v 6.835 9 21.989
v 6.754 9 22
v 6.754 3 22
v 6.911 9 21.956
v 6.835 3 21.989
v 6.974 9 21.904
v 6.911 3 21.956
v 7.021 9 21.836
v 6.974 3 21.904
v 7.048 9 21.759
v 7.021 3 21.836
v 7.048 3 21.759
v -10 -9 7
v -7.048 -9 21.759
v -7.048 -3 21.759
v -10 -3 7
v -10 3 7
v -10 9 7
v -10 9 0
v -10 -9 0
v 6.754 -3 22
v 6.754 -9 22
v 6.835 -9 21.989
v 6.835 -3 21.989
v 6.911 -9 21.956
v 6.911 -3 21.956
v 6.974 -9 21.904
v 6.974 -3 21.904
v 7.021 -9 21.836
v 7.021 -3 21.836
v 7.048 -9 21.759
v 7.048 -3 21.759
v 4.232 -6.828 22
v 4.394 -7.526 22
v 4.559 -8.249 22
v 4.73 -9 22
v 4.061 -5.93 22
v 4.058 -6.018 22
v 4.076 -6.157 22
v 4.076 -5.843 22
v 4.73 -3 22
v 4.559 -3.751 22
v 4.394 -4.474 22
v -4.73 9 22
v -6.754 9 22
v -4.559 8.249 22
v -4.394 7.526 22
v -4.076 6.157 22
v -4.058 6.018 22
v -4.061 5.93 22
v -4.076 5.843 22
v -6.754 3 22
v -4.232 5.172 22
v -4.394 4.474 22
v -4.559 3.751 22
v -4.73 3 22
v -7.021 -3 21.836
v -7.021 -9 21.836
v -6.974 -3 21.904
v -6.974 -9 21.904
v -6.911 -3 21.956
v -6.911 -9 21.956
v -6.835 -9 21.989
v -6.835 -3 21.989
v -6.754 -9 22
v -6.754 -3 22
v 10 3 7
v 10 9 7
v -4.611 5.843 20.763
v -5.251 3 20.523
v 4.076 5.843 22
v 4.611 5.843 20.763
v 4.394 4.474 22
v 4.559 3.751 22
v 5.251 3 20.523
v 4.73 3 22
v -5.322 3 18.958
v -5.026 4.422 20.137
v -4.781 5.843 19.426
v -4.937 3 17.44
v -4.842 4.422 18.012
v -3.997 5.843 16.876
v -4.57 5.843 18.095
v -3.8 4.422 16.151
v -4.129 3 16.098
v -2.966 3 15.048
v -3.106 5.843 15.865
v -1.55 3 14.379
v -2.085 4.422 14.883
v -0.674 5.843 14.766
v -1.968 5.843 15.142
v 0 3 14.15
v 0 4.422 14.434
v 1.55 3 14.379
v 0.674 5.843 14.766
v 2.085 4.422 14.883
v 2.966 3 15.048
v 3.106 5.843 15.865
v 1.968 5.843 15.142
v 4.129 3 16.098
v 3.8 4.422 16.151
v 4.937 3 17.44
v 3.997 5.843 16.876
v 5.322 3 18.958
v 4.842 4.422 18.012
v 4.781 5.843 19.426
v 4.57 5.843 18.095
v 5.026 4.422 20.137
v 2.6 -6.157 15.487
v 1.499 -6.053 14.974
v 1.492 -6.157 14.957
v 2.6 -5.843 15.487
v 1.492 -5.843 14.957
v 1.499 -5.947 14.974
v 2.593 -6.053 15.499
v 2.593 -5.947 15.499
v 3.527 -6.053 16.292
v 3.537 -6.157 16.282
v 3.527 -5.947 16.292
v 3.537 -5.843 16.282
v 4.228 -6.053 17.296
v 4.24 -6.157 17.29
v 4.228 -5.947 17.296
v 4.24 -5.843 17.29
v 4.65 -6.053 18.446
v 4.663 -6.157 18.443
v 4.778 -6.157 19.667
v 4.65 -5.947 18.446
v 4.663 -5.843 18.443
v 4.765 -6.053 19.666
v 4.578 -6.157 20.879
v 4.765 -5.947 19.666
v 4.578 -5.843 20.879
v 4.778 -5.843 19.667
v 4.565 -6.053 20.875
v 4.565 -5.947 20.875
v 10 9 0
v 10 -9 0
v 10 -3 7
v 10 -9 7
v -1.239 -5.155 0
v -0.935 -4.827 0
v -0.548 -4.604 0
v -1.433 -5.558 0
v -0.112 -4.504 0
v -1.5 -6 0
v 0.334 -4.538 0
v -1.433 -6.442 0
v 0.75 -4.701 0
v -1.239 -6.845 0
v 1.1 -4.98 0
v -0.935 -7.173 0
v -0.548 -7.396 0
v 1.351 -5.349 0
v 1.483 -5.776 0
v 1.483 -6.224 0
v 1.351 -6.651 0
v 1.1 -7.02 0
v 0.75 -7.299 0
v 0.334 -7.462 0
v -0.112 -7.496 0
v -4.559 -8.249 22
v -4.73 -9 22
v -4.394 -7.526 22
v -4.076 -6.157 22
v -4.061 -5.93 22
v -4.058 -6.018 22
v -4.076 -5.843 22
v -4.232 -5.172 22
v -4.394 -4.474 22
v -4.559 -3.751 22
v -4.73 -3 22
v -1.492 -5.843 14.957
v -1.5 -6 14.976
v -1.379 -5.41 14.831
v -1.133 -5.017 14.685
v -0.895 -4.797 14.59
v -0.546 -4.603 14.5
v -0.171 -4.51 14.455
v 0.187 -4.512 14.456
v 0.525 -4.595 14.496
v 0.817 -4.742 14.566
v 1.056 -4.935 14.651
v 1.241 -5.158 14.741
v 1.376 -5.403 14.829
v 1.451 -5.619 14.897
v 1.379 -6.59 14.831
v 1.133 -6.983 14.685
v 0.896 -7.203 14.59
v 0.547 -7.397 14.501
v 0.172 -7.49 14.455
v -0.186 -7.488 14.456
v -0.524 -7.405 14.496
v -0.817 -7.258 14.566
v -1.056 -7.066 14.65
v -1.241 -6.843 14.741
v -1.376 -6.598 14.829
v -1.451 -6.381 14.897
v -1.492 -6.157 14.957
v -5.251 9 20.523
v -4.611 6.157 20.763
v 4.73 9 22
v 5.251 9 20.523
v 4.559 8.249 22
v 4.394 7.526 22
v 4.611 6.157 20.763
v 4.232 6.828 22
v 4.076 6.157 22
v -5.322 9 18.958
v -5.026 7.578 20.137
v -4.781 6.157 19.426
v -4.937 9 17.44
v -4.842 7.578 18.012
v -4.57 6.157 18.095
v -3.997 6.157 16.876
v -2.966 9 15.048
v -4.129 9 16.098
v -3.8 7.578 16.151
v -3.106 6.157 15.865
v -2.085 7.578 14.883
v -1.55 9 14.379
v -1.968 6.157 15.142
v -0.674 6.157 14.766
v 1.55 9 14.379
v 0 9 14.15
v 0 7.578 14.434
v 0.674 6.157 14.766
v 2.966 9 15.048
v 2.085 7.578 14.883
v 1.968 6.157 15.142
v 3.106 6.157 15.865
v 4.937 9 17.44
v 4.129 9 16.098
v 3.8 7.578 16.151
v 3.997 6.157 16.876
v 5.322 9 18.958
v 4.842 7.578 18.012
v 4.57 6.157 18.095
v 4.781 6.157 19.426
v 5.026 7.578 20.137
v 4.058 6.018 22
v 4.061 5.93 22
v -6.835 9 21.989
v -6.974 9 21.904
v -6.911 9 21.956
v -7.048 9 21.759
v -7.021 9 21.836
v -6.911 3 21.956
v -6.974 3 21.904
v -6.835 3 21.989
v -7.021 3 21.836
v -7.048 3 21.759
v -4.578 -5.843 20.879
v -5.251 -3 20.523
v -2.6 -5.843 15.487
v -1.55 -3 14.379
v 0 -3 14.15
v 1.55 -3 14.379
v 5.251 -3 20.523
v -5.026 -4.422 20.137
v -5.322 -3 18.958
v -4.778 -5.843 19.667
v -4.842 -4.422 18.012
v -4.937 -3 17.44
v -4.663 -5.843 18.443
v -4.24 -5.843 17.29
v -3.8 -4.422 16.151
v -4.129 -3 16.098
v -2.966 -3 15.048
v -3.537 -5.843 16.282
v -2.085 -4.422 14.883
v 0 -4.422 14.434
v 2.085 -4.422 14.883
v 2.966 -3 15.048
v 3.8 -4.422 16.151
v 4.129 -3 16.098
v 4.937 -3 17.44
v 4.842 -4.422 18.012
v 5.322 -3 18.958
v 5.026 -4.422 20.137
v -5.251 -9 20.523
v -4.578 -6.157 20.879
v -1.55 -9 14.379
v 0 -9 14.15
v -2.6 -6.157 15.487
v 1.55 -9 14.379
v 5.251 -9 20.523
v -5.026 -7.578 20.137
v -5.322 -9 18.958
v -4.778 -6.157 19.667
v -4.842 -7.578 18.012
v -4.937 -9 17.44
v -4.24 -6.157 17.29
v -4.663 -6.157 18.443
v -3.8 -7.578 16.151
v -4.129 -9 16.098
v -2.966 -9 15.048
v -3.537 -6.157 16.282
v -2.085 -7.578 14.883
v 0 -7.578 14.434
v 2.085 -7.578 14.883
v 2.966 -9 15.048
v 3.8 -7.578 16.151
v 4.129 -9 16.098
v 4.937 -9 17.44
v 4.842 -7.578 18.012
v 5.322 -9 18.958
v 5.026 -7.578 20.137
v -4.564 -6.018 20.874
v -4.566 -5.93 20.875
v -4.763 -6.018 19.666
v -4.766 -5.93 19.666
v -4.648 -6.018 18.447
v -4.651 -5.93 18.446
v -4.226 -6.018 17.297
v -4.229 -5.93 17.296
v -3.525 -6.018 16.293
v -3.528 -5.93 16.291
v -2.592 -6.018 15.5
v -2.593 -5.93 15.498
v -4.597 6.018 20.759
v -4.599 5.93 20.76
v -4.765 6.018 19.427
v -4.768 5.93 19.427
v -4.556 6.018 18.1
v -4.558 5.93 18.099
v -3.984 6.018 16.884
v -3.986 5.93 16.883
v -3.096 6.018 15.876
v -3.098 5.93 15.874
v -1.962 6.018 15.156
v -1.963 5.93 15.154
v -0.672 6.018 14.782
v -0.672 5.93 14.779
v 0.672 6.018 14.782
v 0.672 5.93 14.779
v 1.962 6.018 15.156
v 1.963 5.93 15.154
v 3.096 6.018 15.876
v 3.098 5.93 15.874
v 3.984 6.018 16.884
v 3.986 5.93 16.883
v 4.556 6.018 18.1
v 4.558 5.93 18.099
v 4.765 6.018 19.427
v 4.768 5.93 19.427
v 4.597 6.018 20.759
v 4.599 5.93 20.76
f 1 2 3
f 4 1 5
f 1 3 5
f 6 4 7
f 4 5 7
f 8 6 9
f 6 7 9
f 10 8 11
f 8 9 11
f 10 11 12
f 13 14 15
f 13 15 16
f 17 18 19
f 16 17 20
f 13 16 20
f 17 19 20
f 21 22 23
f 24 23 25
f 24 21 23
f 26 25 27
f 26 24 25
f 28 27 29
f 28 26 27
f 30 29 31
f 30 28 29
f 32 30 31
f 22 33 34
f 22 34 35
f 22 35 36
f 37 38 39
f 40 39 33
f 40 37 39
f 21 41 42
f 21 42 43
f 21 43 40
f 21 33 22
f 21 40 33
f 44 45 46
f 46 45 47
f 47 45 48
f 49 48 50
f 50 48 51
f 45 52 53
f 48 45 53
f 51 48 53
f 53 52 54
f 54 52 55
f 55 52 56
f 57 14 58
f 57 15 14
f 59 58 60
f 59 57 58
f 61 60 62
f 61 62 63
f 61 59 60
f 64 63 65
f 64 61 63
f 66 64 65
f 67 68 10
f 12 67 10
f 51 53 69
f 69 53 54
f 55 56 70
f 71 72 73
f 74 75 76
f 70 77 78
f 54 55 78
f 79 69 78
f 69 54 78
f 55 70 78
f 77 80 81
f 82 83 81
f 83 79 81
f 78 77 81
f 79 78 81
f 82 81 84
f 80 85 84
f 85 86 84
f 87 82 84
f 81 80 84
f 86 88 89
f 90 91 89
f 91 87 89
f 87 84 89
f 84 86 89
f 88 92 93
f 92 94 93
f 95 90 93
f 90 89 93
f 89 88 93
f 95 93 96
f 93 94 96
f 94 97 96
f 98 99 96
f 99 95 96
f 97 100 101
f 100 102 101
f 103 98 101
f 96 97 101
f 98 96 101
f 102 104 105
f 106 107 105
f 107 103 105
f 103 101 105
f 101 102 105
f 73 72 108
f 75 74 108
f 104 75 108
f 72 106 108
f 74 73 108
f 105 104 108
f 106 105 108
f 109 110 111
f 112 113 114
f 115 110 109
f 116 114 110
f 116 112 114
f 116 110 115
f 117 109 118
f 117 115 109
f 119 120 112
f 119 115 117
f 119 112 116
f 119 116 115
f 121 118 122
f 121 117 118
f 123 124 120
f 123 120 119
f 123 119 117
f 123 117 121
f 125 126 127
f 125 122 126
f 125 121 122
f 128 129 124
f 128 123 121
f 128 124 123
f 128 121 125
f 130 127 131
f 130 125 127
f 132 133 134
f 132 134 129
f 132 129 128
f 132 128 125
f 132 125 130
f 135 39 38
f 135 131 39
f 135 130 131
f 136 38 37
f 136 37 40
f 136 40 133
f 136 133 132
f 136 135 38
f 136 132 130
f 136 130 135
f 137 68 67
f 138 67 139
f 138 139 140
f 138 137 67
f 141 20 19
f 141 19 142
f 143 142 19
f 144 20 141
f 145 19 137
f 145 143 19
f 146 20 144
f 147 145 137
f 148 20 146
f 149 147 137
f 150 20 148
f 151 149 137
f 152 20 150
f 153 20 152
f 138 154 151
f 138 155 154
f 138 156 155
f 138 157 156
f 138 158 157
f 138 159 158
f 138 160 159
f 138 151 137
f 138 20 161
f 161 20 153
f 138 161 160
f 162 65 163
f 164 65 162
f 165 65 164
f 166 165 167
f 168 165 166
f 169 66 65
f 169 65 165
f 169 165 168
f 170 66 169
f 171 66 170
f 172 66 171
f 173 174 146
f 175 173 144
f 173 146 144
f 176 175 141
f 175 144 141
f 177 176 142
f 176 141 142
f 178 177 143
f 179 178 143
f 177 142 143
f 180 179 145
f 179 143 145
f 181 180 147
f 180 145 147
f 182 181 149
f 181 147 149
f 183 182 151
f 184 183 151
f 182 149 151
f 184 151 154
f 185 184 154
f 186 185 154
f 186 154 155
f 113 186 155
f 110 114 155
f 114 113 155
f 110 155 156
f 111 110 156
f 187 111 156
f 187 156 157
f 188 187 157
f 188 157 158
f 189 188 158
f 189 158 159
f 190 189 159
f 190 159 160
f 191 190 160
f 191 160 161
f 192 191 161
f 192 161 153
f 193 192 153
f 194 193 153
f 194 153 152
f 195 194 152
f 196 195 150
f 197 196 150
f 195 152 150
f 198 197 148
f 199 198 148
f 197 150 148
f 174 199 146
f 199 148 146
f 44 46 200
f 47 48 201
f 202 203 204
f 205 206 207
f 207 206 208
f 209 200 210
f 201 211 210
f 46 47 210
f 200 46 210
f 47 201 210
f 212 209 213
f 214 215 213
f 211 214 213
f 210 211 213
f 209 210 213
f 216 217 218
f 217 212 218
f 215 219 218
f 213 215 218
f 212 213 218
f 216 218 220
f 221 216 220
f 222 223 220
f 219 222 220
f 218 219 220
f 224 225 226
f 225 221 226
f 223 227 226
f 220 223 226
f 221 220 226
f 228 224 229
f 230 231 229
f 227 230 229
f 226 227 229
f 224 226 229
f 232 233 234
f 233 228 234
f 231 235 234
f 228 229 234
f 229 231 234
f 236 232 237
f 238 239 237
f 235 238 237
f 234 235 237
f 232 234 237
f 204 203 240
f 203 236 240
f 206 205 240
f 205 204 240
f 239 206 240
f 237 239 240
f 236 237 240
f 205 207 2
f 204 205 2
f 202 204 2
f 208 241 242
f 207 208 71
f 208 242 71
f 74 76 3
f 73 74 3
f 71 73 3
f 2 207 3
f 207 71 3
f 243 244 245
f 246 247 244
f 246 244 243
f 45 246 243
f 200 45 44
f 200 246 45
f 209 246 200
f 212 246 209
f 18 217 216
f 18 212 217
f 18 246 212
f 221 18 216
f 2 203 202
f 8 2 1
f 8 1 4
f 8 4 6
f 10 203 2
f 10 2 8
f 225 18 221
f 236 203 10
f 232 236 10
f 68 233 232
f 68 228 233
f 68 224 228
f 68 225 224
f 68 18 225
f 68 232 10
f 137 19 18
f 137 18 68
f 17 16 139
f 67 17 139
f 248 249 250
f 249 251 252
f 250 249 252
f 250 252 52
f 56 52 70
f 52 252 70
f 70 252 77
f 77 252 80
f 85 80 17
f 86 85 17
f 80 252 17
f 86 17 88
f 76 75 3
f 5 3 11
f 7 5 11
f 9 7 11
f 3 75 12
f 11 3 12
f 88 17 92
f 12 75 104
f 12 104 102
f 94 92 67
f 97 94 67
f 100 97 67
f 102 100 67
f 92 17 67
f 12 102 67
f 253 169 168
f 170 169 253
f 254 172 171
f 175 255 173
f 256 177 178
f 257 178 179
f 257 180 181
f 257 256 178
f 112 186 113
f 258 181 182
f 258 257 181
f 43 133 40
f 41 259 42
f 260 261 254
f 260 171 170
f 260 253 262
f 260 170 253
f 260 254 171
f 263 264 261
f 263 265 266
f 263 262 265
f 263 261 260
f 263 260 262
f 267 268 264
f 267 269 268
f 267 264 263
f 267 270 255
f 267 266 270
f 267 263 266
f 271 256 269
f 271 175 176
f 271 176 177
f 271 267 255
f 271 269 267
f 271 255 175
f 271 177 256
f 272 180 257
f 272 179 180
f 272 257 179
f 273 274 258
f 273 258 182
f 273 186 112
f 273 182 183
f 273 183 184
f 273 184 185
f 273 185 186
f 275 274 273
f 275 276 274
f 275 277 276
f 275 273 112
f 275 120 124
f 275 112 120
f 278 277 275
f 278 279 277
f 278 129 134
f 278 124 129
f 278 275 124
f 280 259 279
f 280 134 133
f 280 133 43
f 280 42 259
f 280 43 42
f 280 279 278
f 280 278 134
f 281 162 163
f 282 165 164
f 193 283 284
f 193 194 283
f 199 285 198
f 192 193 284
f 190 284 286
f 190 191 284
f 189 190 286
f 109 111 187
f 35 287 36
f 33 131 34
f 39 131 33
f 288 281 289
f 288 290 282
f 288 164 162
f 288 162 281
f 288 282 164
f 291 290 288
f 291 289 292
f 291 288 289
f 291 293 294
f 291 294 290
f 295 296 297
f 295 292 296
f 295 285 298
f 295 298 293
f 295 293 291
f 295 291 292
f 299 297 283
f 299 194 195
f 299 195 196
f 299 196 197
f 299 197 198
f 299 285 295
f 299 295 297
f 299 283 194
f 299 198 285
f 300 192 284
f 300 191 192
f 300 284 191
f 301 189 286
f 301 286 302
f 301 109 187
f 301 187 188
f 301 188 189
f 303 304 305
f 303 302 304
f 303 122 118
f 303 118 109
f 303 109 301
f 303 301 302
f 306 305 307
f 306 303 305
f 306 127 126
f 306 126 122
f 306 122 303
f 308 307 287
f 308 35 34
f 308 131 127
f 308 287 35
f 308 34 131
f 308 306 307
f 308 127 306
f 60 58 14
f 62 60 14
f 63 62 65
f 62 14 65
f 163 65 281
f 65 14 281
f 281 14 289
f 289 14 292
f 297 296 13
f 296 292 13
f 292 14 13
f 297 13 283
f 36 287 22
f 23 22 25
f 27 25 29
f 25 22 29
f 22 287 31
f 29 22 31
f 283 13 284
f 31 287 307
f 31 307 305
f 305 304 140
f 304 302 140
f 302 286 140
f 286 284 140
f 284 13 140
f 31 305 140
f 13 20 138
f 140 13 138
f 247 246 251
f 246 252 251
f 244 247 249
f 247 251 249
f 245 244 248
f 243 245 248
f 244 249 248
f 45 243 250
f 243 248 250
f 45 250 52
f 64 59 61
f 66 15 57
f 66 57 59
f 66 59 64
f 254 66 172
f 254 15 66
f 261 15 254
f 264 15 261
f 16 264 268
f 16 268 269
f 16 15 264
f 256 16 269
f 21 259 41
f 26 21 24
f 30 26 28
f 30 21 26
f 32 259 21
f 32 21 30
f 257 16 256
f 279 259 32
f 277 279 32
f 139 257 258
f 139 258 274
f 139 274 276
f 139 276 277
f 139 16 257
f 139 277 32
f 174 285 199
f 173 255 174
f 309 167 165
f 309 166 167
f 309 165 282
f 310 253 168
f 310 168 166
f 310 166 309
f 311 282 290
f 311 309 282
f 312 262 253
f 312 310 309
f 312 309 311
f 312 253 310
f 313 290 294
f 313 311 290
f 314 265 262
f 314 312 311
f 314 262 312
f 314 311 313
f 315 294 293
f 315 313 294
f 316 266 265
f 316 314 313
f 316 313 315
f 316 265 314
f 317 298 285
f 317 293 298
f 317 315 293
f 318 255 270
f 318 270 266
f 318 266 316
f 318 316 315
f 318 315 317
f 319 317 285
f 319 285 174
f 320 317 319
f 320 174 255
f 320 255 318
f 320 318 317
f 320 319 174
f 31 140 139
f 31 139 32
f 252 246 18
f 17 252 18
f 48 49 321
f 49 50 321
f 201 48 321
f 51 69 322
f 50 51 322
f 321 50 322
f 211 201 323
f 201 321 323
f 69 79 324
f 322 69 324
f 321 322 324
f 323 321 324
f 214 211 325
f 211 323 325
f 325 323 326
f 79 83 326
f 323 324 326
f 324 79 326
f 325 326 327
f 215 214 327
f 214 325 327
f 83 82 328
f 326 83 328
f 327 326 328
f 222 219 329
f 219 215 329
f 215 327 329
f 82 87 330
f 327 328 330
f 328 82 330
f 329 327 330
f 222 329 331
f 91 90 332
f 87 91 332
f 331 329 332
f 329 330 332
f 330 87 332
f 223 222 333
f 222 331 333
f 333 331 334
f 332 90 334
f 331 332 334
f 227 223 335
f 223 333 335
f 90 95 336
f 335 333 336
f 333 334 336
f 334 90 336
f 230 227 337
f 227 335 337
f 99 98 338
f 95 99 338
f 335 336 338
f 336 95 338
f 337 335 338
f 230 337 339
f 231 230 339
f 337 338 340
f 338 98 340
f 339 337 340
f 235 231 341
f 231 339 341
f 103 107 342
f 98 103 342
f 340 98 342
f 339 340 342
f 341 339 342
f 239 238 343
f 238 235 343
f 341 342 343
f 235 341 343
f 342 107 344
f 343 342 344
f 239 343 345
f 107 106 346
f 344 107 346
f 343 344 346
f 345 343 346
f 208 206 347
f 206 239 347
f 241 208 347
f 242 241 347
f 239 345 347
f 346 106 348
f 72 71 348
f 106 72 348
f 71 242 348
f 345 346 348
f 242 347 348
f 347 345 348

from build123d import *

# Parameters (mm, degrees)
SKETCH1_W               = 20
SKETCH1_H               = 18
BOSS_EXTRUDE1_DEPTH     = 7
SKETCH2_W               = 20
SKETCH2_H               = 6
BOSS_EXTRUDE2_DEPTH     = 15
SKETCH3_R               = 5.35
CUT_EXTRUDE1_DEPTH      = 18
SKETCH5_W               = 14
SKETCH5_H               = 6
CUT_EXTRUDE2_DEPTH      = 3.85
FILLET1_R               = 0.3
SKETCH6_W               = 20
SKETCH6_H               = 9
CUT_EXTRUDE3_DEPTH      = 16.0000001
CUT_EXTRUDE3_DEPTH_BACK = 8
SKETCH7_R               = 1.5
CUT_EXTRUDE4_DEPTH      = 1
CUT_EXTRUDE4_DEPTH_BACK = 23.0000001


with BuildPart() as part:
    # Sketch1 → Boss-Extrude1 (new body)
    with BuildSketch(Plane.XY):
        Rectangle(SKETCH1_W, SKETCH1_H)
    extrude(amount=BOSS_EXTRUDE1_DEPTH)

    # Sketch2 → Boss-Extrude2 (add)
    with BuildSketch(Plane.XY.offset(7)):
        with Locations((0, -6)):
            Rectangle(SKETCH2_W, SKETCH2_H)
        with Locations((0, 6)):
            Rectangle(SKETCH2_W, SKETCH2_H)
    extrude(amount=BOSS_EXTRUDE2_DEPTH)

    # Sketch3 → Cut-Extrude1 (cut)
    with BuildSketch(Plane.XZ.offset(9)):
        with Locations((0, 19.5)):
            Circle(SKETCH3_R)
        Polygon((-7, 22), (-10, 7), (-10, 22), align=None)
        Polygon((7, 22), (10, 22), (10, 7), align=None)
    extrude(amount=-CUT_EXTRUDE1_DEPTH, mode=Mode.SUBTRACT)

    # Sketch4 → Revolve4 (revolve)
    with BuildSketch(Plane.XY.offset(19.5)):
        with BuildLine():
            Line((-5.35, -3), (-5.35, -9))
            Line((-5.35, -9), (-4.781378582, -6.156892908))
            ThreePointArc((-4.781378582, -6.156892908), (-4.765843122, -6), (-4.781378582, -5.843107092))
            Line((-4.781378582, -5.843107092), (-5.35, -3))
        make_face()
    revolve(axis=Axis((0, -3, 19.5), (0, -1, 0)))

    # Sketch5 → Cut-Extrude2 (cut, through all)
    with BuildSketch(Plane.XY.offset(22)):
        with Locations((0, -6)):
            Rectangle(SKETCH5_W, SKETCH5_H)
    extrude(amount=CUT_EXTRUDE2_DEPTH, mode=Mode.SUBTRACT)

    # Fillet1
    fillet1_edges = [part.edges().sort_by_distance(p)[0] for p in [
        (7, -6, 22),
        (-7, -6, 22),
        (-7, 6, 22),
        (7, 6, 22),
        (-4.729957717, 6, 22),
        (4.729957717, 6, 22),
    ]]
    fillet(fillet1_edges, radius=FILLET1_R)

    # Sketch6 → Cut-Extrude3 (cut, two sides)
    with BuildSketch(Plane.XY.offset(7)) as cut_extrude3_sk:
        with Locations((0, 4.5)):
            Rectangle(SKETCH6_W, SKETCH6_H)
    extrude(amount=CUT_EXTRUDE3_DEPTH, mode=Mode.SUBTRACT)
    extrude(cut_extrude3_sk.sketch, amount=-CUT_EXTRUDE3_DEPTH_BACK, mode=Mode.SUBTRACT)

    # Mirror2: part across plane


with BuildPart() as part_1:
    add(part.part)
    add(part.part.mirror(Plane(origin=(-10, 0, 0), x_dir=(0, 0, 1), z_dir=(0, -1, 0))))

    # Sketch7 → Cut-Extrude4 (cut, two sides)
    with BuildSketch(Plane(origin=(0, 0, 0), x_dir=(-1, 0, 0), z_dir=(0, 0, -1))) as cut_extrude4_sk:
        with Locations((0, -6)):
            Circle(SKETCH7_R)
    extrude(amount=CUT_EXTRUDE4_DEPTH, mode=Mode.SUBTRACT)
    extrude(cut_extrude4_sk.sketch, amount=-CUT_EXTRUDE4_DEPTH_BACK, mode=Mode.SUBTRACT)


solid = part_1.part
